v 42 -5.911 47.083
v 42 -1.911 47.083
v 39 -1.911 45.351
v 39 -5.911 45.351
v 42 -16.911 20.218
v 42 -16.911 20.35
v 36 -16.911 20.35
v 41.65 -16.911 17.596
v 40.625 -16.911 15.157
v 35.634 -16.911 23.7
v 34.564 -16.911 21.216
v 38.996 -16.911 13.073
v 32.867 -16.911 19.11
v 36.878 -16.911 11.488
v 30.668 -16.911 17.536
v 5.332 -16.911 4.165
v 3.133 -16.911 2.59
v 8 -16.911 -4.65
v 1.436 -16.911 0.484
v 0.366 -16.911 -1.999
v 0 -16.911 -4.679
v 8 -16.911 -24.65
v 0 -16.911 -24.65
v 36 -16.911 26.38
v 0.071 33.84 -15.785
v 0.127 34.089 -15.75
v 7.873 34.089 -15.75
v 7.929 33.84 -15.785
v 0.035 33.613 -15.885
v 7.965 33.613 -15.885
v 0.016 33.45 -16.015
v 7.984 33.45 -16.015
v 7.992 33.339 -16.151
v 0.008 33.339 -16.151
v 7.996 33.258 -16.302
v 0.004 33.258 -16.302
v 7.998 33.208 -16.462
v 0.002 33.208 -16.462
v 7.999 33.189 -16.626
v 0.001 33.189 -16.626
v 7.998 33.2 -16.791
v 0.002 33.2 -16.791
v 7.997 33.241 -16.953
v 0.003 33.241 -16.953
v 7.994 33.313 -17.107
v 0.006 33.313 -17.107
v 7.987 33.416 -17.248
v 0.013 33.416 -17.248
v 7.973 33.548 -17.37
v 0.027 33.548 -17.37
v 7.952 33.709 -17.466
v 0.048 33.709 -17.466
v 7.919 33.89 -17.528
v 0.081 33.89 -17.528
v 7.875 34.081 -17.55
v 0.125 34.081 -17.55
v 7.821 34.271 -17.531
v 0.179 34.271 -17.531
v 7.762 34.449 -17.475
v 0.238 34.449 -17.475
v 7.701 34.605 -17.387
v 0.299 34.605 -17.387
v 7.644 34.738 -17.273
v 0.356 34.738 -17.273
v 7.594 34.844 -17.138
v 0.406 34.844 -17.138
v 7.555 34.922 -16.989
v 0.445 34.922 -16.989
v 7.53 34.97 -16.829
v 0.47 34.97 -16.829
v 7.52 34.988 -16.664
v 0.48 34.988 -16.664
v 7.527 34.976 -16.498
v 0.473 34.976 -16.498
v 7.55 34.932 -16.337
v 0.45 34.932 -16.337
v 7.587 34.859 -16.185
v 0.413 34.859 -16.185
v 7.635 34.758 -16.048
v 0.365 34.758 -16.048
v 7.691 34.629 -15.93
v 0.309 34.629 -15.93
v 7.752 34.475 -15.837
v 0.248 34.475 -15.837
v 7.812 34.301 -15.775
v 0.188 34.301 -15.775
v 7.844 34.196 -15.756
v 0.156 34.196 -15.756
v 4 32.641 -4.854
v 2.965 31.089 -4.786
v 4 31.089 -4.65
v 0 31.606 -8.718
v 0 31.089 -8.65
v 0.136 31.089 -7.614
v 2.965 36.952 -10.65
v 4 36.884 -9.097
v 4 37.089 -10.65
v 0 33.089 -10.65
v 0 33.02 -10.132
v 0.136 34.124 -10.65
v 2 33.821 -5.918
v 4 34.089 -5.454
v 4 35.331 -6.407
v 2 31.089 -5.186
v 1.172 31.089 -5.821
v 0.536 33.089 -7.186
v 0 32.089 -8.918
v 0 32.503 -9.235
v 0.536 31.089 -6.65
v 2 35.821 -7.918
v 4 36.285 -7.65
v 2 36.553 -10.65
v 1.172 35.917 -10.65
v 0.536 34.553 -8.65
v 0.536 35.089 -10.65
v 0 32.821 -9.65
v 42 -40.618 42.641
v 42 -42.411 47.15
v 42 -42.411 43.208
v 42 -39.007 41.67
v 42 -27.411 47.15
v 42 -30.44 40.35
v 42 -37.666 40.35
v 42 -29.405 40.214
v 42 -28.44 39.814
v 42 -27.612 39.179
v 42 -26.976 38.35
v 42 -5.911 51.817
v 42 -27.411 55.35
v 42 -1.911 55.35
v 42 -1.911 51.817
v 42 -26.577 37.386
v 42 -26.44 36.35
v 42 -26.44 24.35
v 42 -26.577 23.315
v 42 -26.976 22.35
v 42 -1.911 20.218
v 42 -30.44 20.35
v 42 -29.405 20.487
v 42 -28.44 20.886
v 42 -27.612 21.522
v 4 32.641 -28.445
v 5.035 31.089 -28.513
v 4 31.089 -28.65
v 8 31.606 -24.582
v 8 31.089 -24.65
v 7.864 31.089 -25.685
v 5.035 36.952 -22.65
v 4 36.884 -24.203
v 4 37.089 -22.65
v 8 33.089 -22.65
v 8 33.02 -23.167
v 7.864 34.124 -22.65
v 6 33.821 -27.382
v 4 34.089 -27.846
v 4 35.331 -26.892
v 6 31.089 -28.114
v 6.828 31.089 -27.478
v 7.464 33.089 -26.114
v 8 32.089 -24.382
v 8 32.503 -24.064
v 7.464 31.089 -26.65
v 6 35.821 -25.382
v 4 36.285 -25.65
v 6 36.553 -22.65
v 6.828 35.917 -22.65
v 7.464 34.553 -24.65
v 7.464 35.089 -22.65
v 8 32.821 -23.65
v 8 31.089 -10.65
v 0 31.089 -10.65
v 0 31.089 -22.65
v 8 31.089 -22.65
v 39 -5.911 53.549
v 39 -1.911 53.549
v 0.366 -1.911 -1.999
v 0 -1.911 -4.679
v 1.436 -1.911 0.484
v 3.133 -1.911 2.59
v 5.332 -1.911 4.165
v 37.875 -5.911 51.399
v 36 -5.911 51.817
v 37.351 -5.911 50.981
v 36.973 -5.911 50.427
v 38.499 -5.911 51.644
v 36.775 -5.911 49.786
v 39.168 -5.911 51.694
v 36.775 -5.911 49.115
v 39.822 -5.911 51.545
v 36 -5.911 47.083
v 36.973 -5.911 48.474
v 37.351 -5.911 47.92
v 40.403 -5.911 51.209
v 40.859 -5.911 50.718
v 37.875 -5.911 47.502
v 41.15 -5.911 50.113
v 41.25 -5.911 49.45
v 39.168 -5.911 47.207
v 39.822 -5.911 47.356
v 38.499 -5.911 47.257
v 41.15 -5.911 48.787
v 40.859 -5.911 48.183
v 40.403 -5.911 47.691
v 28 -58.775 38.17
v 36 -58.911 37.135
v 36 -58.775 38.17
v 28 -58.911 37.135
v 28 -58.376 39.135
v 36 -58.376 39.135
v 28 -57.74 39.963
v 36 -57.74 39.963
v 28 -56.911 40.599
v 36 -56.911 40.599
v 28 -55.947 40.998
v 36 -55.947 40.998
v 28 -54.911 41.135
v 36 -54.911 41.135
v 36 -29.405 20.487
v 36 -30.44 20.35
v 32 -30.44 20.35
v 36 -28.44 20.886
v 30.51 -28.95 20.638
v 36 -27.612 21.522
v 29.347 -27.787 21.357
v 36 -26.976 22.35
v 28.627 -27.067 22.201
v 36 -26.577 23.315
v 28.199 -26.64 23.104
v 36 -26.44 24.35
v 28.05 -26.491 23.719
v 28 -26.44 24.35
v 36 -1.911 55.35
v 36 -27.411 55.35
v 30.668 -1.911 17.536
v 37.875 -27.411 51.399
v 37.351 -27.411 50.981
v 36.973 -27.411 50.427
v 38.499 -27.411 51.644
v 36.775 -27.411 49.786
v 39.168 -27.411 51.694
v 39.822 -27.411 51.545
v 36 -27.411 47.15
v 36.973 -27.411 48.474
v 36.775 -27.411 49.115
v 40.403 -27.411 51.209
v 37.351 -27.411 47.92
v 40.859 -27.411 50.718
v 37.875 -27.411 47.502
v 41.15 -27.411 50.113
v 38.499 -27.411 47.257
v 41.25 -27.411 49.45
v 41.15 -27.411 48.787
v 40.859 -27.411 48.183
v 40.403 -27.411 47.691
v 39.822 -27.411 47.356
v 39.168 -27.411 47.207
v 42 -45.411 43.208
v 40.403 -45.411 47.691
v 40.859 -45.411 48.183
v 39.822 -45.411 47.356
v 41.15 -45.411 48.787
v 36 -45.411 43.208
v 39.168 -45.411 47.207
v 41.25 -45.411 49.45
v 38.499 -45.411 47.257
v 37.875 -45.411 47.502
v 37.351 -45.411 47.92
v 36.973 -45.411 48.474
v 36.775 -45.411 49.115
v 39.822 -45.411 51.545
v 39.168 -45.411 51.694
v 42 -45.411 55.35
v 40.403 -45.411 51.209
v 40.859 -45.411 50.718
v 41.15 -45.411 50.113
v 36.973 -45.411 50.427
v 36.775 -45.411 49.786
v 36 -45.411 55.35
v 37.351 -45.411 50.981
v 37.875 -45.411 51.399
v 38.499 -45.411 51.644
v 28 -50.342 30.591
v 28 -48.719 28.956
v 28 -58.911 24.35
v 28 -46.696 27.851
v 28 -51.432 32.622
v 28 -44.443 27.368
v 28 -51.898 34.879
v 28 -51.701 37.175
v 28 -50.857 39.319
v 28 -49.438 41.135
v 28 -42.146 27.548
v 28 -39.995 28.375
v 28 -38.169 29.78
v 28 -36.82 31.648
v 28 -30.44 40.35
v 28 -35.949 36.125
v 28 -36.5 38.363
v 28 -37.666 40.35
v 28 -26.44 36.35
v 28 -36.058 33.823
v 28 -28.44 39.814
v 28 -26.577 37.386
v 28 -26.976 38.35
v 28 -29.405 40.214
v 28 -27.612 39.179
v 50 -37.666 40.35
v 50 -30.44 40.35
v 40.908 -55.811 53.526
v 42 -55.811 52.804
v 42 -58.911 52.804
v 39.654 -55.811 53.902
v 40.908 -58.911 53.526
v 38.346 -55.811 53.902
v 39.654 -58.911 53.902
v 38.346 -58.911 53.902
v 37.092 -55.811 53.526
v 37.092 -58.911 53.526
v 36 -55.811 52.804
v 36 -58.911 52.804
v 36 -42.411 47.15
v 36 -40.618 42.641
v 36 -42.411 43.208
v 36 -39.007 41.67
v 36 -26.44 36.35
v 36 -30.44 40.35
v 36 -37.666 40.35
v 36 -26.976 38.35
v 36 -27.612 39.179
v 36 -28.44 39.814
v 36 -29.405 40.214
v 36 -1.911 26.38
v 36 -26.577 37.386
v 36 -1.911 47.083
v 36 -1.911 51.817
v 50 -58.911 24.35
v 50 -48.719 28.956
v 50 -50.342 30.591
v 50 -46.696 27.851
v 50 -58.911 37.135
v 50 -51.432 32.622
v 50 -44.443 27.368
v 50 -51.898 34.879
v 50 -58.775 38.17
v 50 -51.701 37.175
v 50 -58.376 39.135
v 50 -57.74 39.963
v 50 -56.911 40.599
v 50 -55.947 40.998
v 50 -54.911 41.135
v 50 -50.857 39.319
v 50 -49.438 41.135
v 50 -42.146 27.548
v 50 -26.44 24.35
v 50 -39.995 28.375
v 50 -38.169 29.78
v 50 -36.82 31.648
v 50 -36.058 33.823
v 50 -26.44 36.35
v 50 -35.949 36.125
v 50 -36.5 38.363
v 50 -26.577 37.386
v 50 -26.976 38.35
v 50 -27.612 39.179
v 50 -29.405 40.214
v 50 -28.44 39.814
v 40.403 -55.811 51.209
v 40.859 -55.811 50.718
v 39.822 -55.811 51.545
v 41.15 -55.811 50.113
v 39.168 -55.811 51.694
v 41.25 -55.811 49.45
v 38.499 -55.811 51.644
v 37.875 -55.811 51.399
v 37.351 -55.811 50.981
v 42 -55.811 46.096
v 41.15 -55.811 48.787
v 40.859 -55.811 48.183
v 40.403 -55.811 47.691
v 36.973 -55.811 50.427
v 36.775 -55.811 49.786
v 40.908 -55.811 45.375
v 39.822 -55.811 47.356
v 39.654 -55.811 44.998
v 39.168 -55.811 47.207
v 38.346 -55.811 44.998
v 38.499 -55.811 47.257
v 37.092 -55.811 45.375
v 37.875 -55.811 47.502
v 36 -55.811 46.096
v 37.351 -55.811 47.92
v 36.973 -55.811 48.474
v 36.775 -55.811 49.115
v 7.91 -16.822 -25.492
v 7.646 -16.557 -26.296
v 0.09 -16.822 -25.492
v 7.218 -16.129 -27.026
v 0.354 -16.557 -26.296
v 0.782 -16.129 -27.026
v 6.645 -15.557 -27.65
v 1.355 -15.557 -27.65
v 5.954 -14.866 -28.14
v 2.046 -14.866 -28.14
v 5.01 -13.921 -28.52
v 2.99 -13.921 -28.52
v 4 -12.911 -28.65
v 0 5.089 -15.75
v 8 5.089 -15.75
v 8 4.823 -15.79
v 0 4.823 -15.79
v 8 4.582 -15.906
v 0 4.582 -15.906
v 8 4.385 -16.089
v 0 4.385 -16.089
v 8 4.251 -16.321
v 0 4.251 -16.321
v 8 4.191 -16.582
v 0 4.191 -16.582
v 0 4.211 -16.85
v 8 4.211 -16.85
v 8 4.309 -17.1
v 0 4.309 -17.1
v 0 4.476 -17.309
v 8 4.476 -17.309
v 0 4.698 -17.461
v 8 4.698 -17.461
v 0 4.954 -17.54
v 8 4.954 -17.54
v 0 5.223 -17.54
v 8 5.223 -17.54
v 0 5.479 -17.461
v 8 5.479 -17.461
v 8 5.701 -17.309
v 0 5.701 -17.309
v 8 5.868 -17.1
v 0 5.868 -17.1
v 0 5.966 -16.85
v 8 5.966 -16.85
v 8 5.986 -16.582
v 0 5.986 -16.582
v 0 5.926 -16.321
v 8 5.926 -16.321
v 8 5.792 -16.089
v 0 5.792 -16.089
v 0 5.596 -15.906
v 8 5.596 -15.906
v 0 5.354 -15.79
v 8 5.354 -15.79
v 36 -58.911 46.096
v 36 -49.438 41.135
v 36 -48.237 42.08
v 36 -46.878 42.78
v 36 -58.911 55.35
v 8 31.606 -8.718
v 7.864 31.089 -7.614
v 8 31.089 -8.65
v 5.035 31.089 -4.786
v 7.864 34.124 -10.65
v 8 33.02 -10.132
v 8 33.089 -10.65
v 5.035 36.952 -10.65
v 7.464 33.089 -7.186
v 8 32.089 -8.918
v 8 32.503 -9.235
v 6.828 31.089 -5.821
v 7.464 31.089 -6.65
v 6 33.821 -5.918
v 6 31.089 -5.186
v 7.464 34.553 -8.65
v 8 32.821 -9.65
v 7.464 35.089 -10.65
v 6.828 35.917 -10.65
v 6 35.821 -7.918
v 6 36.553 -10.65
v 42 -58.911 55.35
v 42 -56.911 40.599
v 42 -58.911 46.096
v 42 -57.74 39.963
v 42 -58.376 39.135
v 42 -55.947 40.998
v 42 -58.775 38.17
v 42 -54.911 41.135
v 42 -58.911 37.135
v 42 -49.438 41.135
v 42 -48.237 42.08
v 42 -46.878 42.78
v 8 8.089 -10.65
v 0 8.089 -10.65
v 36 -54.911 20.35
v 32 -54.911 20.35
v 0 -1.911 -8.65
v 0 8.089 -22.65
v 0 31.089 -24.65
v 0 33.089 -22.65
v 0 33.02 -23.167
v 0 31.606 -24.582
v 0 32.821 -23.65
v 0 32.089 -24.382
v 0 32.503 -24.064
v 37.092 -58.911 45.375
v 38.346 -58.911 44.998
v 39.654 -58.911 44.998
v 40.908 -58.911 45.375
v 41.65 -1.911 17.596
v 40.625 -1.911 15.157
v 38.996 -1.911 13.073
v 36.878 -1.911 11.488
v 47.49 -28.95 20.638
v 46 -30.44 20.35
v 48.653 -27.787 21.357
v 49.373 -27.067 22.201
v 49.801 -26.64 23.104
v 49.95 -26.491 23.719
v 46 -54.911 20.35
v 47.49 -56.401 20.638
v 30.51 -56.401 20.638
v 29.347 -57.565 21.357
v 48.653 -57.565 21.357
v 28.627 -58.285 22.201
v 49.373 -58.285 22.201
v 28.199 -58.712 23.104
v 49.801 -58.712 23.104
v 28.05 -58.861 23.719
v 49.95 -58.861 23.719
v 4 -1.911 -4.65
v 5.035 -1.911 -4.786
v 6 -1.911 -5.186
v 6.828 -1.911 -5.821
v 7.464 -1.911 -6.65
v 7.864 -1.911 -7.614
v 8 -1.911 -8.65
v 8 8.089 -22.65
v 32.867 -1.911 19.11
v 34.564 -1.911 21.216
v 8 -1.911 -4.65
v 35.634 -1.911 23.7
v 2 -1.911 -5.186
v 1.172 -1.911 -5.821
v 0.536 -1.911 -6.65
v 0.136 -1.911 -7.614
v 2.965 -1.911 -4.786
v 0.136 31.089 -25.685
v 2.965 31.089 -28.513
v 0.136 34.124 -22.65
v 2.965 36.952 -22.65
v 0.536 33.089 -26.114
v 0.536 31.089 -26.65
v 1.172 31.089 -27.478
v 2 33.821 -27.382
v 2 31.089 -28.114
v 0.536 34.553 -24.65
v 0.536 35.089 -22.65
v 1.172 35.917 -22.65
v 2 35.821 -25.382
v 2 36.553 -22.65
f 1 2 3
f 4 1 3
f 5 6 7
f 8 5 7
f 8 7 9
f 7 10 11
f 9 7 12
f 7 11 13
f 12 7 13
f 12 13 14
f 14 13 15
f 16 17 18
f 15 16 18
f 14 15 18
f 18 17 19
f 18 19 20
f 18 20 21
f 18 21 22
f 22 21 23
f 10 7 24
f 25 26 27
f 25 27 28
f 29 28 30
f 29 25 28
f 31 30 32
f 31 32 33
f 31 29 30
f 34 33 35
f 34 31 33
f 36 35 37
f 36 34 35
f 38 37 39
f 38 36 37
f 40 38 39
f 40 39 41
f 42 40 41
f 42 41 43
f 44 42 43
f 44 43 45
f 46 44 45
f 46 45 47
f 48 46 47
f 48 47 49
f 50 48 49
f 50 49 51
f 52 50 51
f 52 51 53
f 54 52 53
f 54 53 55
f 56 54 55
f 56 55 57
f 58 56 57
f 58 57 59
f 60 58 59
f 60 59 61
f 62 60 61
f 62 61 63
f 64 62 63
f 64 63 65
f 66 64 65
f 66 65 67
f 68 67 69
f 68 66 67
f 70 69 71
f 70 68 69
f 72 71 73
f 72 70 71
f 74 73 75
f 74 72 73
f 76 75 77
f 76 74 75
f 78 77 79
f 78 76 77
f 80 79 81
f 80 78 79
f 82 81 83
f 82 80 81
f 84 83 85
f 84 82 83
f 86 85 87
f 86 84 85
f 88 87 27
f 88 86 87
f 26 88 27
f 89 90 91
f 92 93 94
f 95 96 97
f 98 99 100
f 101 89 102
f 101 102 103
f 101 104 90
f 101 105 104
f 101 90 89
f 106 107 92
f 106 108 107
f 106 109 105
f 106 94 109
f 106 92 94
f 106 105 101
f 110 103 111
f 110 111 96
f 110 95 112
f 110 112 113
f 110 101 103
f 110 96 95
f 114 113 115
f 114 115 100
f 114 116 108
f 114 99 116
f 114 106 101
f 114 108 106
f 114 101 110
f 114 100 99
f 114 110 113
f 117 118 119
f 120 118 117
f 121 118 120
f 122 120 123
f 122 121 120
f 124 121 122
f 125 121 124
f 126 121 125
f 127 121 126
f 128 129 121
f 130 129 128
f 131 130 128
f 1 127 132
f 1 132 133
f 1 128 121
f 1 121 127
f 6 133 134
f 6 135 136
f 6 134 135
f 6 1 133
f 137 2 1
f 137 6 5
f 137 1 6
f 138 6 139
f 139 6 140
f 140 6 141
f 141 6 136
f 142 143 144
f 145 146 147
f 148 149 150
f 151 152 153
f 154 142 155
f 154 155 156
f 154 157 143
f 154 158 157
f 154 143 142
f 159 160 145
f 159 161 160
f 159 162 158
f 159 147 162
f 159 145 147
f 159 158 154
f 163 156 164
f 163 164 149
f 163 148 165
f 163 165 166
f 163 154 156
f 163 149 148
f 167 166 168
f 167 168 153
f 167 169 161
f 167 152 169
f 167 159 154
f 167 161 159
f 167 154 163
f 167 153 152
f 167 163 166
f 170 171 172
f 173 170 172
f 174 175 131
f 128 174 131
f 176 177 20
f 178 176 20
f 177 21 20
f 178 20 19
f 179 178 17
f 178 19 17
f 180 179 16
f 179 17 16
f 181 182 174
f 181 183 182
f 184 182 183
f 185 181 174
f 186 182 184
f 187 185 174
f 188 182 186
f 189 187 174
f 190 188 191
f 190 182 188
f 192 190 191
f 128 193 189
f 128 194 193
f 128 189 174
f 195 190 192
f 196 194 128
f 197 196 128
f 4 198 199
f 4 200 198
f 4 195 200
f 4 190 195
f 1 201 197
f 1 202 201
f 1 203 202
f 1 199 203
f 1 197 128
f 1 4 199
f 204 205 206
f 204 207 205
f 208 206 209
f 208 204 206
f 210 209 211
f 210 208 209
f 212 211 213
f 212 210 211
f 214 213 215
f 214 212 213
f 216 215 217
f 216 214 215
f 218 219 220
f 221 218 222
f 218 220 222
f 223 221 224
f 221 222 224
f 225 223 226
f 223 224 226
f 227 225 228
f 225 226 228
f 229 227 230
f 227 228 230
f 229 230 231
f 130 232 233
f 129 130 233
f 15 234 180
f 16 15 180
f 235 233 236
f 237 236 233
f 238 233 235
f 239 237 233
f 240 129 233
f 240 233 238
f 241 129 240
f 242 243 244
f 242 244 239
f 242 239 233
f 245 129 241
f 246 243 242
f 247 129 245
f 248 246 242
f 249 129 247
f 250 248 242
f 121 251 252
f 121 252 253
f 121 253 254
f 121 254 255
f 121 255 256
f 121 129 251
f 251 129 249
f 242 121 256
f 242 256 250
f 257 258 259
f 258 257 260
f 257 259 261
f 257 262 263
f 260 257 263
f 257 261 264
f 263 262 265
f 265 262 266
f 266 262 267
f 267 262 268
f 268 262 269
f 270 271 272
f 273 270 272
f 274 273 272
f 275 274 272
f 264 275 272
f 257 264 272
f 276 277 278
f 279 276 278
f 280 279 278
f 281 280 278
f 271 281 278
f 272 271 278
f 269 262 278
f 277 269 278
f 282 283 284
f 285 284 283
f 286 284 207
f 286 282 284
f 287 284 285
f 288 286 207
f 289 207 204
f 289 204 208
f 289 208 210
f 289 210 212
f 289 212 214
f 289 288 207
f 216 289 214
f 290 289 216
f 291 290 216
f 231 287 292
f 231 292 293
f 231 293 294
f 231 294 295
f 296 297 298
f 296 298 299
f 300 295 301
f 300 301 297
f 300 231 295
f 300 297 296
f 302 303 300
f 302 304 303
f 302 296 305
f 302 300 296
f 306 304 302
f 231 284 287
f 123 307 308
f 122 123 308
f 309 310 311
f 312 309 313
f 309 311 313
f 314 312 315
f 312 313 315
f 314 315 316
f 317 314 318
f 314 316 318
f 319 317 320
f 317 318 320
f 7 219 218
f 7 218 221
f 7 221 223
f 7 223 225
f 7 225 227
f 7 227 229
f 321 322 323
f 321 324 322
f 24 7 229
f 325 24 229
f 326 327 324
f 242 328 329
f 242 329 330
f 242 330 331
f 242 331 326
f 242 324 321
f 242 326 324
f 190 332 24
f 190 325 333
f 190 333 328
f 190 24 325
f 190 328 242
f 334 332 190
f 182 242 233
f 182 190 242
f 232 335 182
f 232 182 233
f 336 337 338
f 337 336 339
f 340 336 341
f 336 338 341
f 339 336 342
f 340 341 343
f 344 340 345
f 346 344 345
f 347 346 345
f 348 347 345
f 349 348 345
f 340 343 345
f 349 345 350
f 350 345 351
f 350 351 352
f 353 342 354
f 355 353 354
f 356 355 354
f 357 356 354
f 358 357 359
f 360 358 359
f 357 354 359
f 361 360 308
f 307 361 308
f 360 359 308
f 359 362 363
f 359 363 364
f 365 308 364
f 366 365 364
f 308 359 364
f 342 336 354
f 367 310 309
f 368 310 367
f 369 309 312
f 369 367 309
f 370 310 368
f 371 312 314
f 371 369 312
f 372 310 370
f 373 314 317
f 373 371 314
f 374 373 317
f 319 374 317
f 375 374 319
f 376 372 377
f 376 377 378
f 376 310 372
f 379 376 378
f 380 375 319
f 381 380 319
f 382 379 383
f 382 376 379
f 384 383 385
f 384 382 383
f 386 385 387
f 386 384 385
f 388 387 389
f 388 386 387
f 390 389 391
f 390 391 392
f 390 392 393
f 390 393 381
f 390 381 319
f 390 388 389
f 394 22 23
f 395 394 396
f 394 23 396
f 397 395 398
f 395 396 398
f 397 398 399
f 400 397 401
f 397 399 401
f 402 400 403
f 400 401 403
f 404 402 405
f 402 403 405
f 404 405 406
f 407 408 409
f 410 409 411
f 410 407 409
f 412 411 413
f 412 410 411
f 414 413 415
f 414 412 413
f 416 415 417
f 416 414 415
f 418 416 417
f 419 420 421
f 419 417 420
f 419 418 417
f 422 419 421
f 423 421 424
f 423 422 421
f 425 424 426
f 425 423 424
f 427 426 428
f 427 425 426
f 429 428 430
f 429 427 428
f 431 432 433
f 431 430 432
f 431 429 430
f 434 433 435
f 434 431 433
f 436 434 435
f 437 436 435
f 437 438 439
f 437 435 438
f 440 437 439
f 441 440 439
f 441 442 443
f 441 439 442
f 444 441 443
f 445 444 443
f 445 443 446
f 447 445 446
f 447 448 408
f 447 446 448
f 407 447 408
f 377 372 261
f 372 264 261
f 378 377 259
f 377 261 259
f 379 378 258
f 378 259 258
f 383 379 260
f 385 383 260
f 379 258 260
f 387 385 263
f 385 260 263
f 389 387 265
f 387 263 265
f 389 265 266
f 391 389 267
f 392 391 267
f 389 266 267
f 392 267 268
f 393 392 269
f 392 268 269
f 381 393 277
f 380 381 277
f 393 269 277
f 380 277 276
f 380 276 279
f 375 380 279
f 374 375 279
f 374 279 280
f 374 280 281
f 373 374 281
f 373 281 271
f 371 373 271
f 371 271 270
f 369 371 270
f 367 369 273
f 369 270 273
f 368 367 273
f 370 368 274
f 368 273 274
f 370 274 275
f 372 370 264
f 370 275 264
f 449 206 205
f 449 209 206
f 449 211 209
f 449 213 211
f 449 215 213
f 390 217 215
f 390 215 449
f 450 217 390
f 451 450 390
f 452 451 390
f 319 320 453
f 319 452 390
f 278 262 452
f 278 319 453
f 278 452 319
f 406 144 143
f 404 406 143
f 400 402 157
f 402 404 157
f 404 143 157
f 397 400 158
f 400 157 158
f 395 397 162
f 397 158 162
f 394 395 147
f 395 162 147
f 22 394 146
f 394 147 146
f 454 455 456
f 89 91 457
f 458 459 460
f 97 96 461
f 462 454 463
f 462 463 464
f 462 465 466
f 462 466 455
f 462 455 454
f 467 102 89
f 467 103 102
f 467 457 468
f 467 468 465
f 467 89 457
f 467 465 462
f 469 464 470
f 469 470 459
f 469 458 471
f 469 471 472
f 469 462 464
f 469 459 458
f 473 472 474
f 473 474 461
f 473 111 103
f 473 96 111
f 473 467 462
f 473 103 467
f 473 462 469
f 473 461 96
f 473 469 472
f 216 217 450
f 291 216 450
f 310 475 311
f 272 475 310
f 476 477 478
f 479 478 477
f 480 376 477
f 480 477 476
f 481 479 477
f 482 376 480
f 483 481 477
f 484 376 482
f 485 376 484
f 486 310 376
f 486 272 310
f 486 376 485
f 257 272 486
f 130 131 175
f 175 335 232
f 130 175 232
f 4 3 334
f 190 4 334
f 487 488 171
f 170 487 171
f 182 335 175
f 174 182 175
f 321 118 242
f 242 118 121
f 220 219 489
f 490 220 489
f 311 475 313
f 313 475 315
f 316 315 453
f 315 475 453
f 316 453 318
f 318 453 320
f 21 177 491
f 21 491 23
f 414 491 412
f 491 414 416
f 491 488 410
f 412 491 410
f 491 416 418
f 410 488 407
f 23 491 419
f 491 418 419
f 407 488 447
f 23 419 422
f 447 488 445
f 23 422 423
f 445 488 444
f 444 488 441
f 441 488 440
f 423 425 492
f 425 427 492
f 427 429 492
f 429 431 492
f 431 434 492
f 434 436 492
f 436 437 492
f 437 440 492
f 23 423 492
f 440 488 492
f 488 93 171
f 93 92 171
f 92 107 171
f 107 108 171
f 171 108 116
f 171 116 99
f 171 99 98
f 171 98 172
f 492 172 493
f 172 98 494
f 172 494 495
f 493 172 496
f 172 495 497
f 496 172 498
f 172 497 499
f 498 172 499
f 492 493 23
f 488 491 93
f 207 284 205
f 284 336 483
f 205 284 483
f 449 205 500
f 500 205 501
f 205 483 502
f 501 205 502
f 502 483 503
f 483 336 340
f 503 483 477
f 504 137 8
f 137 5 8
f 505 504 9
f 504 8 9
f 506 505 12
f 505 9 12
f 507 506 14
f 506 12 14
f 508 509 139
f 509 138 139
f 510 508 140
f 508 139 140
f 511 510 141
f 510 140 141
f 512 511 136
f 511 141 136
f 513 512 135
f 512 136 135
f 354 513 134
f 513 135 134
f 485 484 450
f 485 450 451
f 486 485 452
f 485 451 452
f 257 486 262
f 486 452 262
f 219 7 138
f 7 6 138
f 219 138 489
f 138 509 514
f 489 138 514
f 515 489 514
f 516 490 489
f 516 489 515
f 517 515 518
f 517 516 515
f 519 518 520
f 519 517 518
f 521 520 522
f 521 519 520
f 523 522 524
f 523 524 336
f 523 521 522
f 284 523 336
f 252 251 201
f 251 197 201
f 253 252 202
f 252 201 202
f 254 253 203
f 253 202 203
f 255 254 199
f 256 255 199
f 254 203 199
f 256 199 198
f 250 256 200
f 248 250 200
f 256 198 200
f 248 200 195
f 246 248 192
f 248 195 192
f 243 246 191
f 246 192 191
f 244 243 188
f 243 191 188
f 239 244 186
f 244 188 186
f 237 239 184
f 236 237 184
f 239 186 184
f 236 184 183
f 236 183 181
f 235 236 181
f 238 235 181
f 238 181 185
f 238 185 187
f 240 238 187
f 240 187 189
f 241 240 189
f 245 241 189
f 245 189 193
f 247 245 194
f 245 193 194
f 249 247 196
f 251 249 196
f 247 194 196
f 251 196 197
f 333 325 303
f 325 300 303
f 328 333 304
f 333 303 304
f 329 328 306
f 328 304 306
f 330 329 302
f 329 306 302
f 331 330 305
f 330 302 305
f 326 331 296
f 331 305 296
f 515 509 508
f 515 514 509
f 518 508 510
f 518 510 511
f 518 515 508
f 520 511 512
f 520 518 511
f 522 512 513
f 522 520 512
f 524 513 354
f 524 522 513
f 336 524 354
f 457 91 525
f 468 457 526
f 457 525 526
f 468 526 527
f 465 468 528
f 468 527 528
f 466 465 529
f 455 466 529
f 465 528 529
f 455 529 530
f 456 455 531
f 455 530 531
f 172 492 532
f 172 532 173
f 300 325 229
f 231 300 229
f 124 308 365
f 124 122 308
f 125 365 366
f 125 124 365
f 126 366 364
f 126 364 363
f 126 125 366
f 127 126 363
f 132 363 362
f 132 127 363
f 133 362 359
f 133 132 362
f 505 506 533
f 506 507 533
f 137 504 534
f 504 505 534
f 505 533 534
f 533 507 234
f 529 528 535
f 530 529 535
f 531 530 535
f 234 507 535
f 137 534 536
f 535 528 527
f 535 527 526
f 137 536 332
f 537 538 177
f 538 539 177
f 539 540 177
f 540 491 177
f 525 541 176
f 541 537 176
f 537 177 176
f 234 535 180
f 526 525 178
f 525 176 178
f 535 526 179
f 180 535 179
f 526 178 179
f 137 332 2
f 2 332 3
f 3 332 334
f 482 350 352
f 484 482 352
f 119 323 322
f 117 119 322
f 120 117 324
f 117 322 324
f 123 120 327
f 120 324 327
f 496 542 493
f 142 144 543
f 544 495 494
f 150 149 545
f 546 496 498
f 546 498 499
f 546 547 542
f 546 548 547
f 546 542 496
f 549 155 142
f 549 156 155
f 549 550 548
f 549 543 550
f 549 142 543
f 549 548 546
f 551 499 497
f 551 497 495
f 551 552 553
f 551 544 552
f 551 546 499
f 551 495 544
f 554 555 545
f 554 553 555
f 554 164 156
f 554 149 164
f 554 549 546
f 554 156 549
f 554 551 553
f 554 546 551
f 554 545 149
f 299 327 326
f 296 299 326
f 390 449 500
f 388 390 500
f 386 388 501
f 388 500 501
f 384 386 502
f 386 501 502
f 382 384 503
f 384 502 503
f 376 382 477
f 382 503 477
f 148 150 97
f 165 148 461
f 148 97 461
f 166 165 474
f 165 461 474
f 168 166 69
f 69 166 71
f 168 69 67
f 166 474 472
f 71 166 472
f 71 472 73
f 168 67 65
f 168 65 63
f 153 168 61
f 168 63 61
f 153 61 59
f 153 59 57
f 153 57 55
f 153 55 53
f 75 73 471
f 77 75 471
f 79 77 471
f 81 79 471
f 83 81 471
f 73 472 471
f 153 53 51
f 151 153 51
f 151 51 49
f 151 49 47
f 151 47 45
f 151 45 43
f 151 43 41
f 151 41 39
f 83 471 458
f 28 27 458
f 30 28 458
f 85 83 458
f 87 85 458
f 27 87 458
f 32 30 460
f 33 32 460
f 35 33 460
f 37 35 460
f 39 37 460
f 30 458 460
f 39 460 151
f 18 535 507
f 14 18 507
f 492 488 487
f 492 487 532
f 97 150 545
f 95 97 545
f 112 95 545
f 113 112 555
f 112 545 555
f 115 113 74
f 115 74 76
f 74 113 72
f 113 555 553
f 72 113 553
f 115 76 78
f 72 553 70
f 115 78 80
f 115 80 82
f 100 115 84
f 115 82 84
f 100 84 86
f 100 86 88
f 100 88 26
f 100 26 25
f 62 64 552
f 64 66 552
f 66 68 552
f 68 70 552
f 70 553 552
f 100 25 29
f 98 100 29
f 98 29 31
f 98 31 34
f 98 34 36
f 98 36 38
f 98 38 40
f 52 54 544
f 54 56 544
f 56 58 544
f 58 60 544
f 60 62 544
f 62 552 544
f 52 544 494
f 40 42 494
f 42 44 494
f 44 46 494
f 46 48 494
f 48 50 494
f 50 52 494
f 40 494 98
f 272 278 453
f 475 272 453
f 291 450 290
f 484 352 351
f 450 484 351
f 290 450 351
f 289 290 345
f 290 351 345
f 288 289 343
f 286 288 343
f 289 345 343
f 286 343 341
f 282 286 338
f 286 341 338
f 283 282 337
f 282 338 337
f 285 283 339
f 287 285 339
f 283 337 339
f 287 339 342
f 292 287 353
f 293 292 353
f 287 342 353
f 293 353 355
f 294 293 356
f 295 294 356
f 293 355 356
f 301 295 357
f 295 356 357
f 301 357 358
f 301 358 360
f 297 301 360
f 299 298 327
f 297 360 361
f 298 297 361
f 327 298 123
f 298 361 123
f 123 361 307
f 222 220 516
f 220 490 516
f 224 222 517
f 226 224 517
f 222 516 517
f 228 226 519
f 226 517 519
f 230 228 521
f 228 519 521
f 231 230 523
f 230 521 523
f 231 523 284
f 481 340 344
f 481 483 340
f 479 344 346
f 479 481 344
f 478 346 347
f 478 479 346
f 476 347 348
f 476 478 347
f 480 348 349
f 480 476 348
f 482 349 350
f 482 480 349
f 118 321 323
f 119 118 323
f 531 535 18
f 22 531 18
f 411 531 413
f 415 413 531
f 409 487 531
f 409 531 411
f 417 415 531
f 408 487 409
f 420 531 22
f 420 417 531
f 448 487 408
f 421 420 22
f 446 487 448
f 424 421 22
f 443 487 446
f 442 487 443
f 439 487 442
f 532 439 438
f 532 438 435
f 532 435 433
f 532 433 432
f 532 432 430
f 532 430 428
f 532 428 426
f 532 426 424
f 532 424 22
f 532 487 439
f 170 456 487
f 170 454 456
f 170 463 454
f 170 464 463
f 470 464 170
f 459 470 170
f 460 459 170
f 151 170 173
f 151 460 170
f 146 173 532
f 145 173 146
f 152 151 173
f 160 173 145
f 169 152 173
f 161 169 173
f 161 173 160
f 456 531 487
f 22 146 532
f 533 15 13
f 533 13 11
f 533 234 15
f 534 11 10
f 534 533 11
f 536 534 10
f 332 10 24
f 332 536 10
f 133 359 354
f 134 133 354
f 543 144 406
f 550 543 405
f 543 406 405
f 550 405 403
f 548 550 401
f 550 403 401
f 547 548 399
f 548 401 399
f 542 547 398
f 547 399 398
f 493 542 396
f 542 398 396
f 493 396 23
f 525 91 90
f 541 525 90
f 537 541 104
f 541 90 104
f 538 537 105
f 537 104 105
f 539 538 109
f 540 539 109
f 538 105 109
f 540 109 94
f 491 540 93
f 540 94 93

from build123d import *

# Parameters (mm, degrees)
SKETCH1_R                                        = 0.9
SKETCH1_W                                        = 12
SKETCH1_H                                        = 23
BOSS_EXTRUDE1_DEPTH                              = 42
CBORE_FOR_M4_PAN_HEAD_MACHINE_SCREW2_D           = 4.5
CBORE_FOR_M4_PAN_HEAD_MACHINE_SCREW2_CBORE_D     = 9
CBORE_FOR_M4_PAN_HEAD_MACHINE_SCREW2_CBORE_DEPTH = 3.1
CUT_EXTRUDE2_DEPTH                               = 4
SKETCH11_W                                       = 35
SKETCH11_H                                       = 57
CUT_EXTRUDE3_DEPTH                               = 36
SKETCH12_W                                       = 24
SKETCH12_H                                       = 54
CUT_EXTRUDE4_DEPTH                               = 34
BOSS_EXTRUDE2_DEPTH                              = 8
BOSS_EXTRUDE2_DEPTH_BACK                         = 14
FILLET3_R                                        = 4
SKETCH14_W                                       = 8.2
SKETCH14_H                                       = 15
CUT_EXTRUDE5_DEPTH                               = 92.094527719
FILLET4_R                                        = 6
FILLET5_R                                        = 4
CUT_EXTRUDE6_DEPTH                               = 94.87574371
FILLET6_R                                        = 10


with BuildPart() as part:
    # Sketch1 → Boss-Extrude1 (new body)
    with BuildSketch(Plane(origin=(0, 0, 0), x_dir=(0, 0, -1), z_dir=(1, 0, 0))):
        with BuildLine():
            Line((-55.350295908, -42.411439664), (-43.208412731, -42.411439664))
            ThreePointArc((-43.208412731, -42.411439664), (-27.350295908, -43.911439664), (-43.208412731, -45.411439664))
            Line((-43.208412731, -45.411439664), (-55.350295908, -45.411439664))
            Line((-55.350295908, -45.411439664), (-55.350295908, -58.911439664))
            Line((-55.350295908, -58.911439664), (-20.350295908, -58.911439664))
            Line((-20.350295908, -58.911439664), (-20.350295908, -16.911439664))
            Line((-20.350295908, -16.911439664), (28.649704092, -16.911439664))
            Line((28.649704092, -16.911439664), (28.649704092, 37.088560336))
            Line((28.649704092, 37.088560336), (4.649704092, 37.088560336))
            Line((4.649704092, 37.088560336), (4.649704092, -1.911439664))
            Line((4.649704092, -1.911439664), (-55.350295908, -1.911439664))
            Line((-55.350295908, -1.911439664), (-55.350295908, -28.911439664))
            Line((-55.350295908, -28.911439664), (-55.350295908, -42.411439664))
        make_face()
        with Locations(Location((16.649704092, 34.088560336, 0), (0, 0, 180))):
            Circle(SKETCH1_R, mode=Mode.SUBTRACT)
        with Locations(Location((16.649704092, 5.088560336, 0), (0, 0, 180))):
            Circle(SKETCH1_R, mode=Mode.SUBTRACT)
        with Locations((16.649704092, 19.588560336)):
            Rectangle(SKETCH1_W, SKETCH1_H, mode=Mode.SUBTRACT)
    extrude(amount=BOSS_EXTRUDE1_DEPTH)

    # CBORE for M4 Pan Head Machine Screw2 (through all)
    with Locations(Plane(origin=(0, -58.911439664, 0), x_dir=(-1, 0, 0), z_dir=(0, -1, 0))):
        with Locations((-39, -49.450295908)):
            CounterBoreHole(CBORE_FOR_M4_PAN_HEAD_MACHINE_SCREW2_D / 2, CBORE_FOR_M4_PAN_HEAD_MACHINE_SCREW2_CBORE_D / 2, CBORE_FOR_M4_PAN_HEAD_MACHINE_SCREW2_CBORE_DEPTH)

    # Sketch7 → Cut-Extrude2 (cut)
    with BuildSketch(Plane(origin=(0, -1.911439664, 0), x_dir=(1, 0, 0), z_dir=(0, 1, 0))):
        Polygon((42.55, -51.499889363), (42.55, -47.400702452), (39, -45.351108997), (35.45, -47.400702452), (35.45, -51.499889363), (39, -53.549482819), align=None)
    extrude(amount=-CUT_EXTRUDE2_DEPTH, mode=Mode.SUBTRACT)

    # Sketch11 → Cut-Extrude3 (cut)
    with BuildSketch(Plane.ZY):
        with Locations((37.850295908, -30.411439664)):
            Rectangle(SKETCH11_W, SKETCH11_H)
    extrude(amount=-CUT_EXTRUDE3_DEPTH, mode=Mode.SUBTRACT)

    # Sketch12 → Cut-Extrude4 (cut)
    with BuildSketch(Plane(origin=(42, 0, 0), x_dir=(0, 0, -1), z_dir=(1, 0, 0))):
        with Locations((16.649704092, 10.088560336)):
            Rectangle(SKETCH12_W, SKETCH12_H)
    extrude(amount=-CUT_EXTRUDE4_DEPTH, mode=Mode.SUBTRACT)

    # Sketch13 → Boss-Extrude2 (add, two sides: drawn at the far end of the back side and taken through both)
    with BuildSketch(Plane.ZY.offset(-36).offset(-BOSS_EXTRUDE2_DEPTH_BACK)):
        with BuildLine():
            Line((40.350295908, -37.666441665), (40.350295908, -26.440452892))
            Line((40.350295908, -26.440452892), (20.350295908, -26.440452892))
            Line((20.350295908, -26.440452892), (20.350295908, -58.911439664))
            Line((20.350295908, -58.911439664), (41.134513551, -58.911439664))
            Line((41.134513551, -58.911439664), (41.134513551, -49.437996119))
            ThreePointArc((41.134513551, -49.437996119), (27.36798978, -44.443218651), (40.350295908, -37.666441665))
        make_face()
    extrude(amount=BOSS_EXTRUDE2_DEPTH + BOSS_EXTRUDE2_DEPTH_BACK)

    # Fillet3
    fillet3_edges = [part.edges().sort_by_distance(p)[0] for p in [
        (32, -58.911439664, 41.134513551),
        (32, -26.440452892, 20.350295908),
        (32, -26.440452892, 40.350295908),
        (46, -58.911439664, 41.134513551),
        (50, -42.675946278, 20.350295908),
        (46, -26.440452892, 20.350295908),
        (46, -26.440452892, 40.350295908),
        (28, -42.675946278, 20.350295908),
        (39, -58.911439664, 20.350295908),
    ]]
    fillet(fillet3_edges, radius=FILLET3_R)

    # Sketch14 → Cut-Extrude5 (cut, through all)
    with BuildSketch(Plane(origin=(42, 0, 0), x_dir=(0, 0, -1), z_dir=(1, 0, 0))):
        with Locations((-51.250295908, -34.911439664)):
            Rectangle(SKETCH14_W, SKETCH14_H)
    extrude(amount=-CUT_EXTRUDE5_DEPTH, mode=Mode.SUBTRACT)

    # Fillet4
    fillet4_edges = [part.edges().sort_by_distance(p)[0] for p in [
        (4, 37.088560336, -4.649704092),
        (4, 37.088560336, -28.649704092),
    ]]
    fillet(fillet4_edges, radius=FILLET4_R)

    # Fillet5
    # the kernel refuses this fillet: 4 mm, written as the material it takes off along each edge
    with BuildSketch(Plane(origin=(0, 31.088560336, -4.649704092), x_dir=(0, 0, -1), z_dir=(0, -1, 0))) as fillet5_piece_1:
        with BuildLine():
            CenterArc((FILLET5_R, FILLET5_R), FILLET5_R, 180, 90)
            Line((0, FILLET5_R), (0, 0))
            Line((0, 0), (FILLET5_R, 0))
        make_face()
    extrude(amount=33, mode=Mode.SUBTRACT)
    with BuildSketch(Plane(origin=(0, 31.088560336, -10.649704092), x_dir=(0, 0, 1), z_dir=(0, -1, 0))) as fillet5_piece_2:
        with BuildLine():
            CenterArc((6 - FILLET5_R, -FILLET5_R), FILLET5_R, 0, 90)
            Line((6, -FILLET5_R), (6, 0))
            Line((6, 0), (6 - FILLET5_R, 0))
        make_face()
    revolve(axis=Axis((0, 31.088560336, -10.649704092), (-1, 0, 0)), revolution_arc=90, mode=Mode.SUBTRACT)
    with BuildSketch(Plane(origin=(0, 37.088560336, -22.649704092), x_dir=(0, -1, 0), z_dir=(0, 0, 1))) as fillet5_piece_3:
        with BuildLine():
            CenterArc((FILLET5_R, FILLET5_R), FILLET5_R, 180, 90)
            Line((0, FILLET5_R), (0, 0))
            Line((0, 0), (FILLET5_R, 0))
        make_face()
    extrude(amount=12, mode=Mode.SUBTRACT)
    with BuildSketch(Plane(origin=(0, 31.088560336, -22.649704092), x_dir=(0, 0, -1), z_dir=(0, -1, 0))) as fillet5_piece_4:
        with BuildLine():
            CenterArc((6 - FILLET5_R, FILLET5_R), FILLET5_R, 270, 90)
            Line((6, FILLET5_R), (6, 0))
            Line((6, 0), (6 - FILLET5_R, 0))
        make_face()
    revolve(axis=Axis((0, 31.088560336, -22.649704092), (1, 0, 0)), revolution_arc=90, mode=Mode.SUBTRACT)
    with BuildSketch(Plane(origin=(8, -1.911439664, -4.649704092), x_dir=(-1, 0, 0), z_dir=(0, 1, 0))) as fillet5_piece_5:
        with BuildLine():
            CenterArc((FILLET5_R, -FILLET5_R), FILLET5_R, 90, 90)
            Line((0, -FILLET5_R), (0, 0))
            Line((0, 0), (FILLET5_R, 0))
        make_face()
    extrude(amount=33, mode=Mode.SUBTRACT)
    with BuildSketch(Plane(origin=(8, 31.088560336, -10.649704092), x_dir=(0, 0, 1), z_dir=(0, -1, 0))) as fillet5_piece_6:
        with BuildLine():
            CenterArc((6 - FILLET5_R, FILLET5_R), FILLET5_R, 270, 90)
            Line((6 - FILLET5_R, 0), (6, 0))
            Line((6, 0), (6, FILLET5_R))
        make_face()
    revolve(axis=Axis((8, 31.088560336, -10.649704092), (-1, 0, 0)), revolution_arc=90, mode=Mode.SUBTRACT)
    with BuildSketch(Plane(origin=(8, 37.088560336, -10.649704092), x_dir=(-1, 0, 0), z_dir=(0, 0, -1))) as fillet5_piece_7:
        with BuildLine():
            CenterArc((FILLET5_R, -FILLET5_R), FILLET5_R, 90, 90)
            Line((0, -FILLET5_R), (0, 0))
            Line((0, 0), (FILLET5_R, 0))
        make_face()
    extrude(amount=12, mode=Mode.SUBTRACT)
    with BuildSketch(Plane(origin=(8, 31.088560336, -22.649704092), x_dir=(0, 0, -1), z_dir=(0, -1, 0))) as fillet5_piece_8:
        with BuildLine():
            CenterArc((6 - FILLET5_R, -FILLET5_R), FILLET5_R, 0, 90)
            Line((6 - FILLET5_R, 0), (6, 0))
            Line((6, 0), (6, -FILLET5_R))
        make_face()
    revolve(axis=Axis((8, 31.088560336, -22.649704092), (1, 0, 0)), revolution_arc=90, mode=Mode.SUBTRACT)
    with BuildSketch(Plane(origin=(0, -26.911439664, -28.649704092), x_dir=(0, 0, 1), z_dir=(0, 1, 0))) as fillet5_piece_9:
        with BuildLine():
            CenterArc((FILLET5_R, FILLET5_R), FILLET5_R, 180, 90)
            Line((0, FILLET5_R), (0, 0))
            Line((0, 0), (FILLET5_R, 0))
        make_face()
    extrude(amount=58, mode=Mode.SUBTRACT)
    with BuildSketch(Plane(origin=(8, 31.088560336, -28.649704092), x_dir=(-1, 0, 0), z_dir=(0, -1, 0))) as fillet5_piece_10:
        with BuildLine():
            CenterArc((FILLET5_R, -FILLET5_R), FILLET5_R, 90, 90)
            Line((0, -FILLET5_R), (0, 0))
            Line((0, 0), (FILLET5_R, 0))
        make_face()
    extrude(amount=58, mode=Mode.SUBTRACT)
    with BuildSketch(Plane(origin=(-10, -16.911439664, -28.649704092), x_dir=(0, 1, 0), z_dir=(1, 0, 0))) as fillet5_piece_11:
        with BuildLine():
            CenterArc((FILLET5_R, FILLET5_R), FILLET5_R, 180, 90)
            Line((0, FILLET5_R), (0, 0))
            Line((0, 0), (FILLET5_R, 0))
        make_face()
    extrude(amount=28, mode=Mode.SUBTRACT)

    # Sketch15 → Cut-Extrude6 (cut, through all)
    with BuildSketch(Plane(origin=(0, -1.911439664, 0), x_dir=(1, 0, 0), z_dir=(0, 1, 0))):
        Polygon((36, -20.350295908), (0, -1.350295908), (0, -20.350295908), align=None)
        Polygon((8, 4.649704092), (42, -14.350295908), (42, 4.649704092), align=None)
    extrude(amount=-CUT_EXTRUDE6_DEPTH, mode=Mode.SUBTRACT)

    # Fillet6
    fillet6_edges = [part.edges().sort_by_distance(p)[0] for p in [
        (36, -9.411439664, 20.350295908),
        (0, -9.411439664, 1.350295908),
        (42, -9.411439664, 14.350295908),
    ]]
    fillet(fillet6_edges, radius=FILLET6_R)


solid = part.part
